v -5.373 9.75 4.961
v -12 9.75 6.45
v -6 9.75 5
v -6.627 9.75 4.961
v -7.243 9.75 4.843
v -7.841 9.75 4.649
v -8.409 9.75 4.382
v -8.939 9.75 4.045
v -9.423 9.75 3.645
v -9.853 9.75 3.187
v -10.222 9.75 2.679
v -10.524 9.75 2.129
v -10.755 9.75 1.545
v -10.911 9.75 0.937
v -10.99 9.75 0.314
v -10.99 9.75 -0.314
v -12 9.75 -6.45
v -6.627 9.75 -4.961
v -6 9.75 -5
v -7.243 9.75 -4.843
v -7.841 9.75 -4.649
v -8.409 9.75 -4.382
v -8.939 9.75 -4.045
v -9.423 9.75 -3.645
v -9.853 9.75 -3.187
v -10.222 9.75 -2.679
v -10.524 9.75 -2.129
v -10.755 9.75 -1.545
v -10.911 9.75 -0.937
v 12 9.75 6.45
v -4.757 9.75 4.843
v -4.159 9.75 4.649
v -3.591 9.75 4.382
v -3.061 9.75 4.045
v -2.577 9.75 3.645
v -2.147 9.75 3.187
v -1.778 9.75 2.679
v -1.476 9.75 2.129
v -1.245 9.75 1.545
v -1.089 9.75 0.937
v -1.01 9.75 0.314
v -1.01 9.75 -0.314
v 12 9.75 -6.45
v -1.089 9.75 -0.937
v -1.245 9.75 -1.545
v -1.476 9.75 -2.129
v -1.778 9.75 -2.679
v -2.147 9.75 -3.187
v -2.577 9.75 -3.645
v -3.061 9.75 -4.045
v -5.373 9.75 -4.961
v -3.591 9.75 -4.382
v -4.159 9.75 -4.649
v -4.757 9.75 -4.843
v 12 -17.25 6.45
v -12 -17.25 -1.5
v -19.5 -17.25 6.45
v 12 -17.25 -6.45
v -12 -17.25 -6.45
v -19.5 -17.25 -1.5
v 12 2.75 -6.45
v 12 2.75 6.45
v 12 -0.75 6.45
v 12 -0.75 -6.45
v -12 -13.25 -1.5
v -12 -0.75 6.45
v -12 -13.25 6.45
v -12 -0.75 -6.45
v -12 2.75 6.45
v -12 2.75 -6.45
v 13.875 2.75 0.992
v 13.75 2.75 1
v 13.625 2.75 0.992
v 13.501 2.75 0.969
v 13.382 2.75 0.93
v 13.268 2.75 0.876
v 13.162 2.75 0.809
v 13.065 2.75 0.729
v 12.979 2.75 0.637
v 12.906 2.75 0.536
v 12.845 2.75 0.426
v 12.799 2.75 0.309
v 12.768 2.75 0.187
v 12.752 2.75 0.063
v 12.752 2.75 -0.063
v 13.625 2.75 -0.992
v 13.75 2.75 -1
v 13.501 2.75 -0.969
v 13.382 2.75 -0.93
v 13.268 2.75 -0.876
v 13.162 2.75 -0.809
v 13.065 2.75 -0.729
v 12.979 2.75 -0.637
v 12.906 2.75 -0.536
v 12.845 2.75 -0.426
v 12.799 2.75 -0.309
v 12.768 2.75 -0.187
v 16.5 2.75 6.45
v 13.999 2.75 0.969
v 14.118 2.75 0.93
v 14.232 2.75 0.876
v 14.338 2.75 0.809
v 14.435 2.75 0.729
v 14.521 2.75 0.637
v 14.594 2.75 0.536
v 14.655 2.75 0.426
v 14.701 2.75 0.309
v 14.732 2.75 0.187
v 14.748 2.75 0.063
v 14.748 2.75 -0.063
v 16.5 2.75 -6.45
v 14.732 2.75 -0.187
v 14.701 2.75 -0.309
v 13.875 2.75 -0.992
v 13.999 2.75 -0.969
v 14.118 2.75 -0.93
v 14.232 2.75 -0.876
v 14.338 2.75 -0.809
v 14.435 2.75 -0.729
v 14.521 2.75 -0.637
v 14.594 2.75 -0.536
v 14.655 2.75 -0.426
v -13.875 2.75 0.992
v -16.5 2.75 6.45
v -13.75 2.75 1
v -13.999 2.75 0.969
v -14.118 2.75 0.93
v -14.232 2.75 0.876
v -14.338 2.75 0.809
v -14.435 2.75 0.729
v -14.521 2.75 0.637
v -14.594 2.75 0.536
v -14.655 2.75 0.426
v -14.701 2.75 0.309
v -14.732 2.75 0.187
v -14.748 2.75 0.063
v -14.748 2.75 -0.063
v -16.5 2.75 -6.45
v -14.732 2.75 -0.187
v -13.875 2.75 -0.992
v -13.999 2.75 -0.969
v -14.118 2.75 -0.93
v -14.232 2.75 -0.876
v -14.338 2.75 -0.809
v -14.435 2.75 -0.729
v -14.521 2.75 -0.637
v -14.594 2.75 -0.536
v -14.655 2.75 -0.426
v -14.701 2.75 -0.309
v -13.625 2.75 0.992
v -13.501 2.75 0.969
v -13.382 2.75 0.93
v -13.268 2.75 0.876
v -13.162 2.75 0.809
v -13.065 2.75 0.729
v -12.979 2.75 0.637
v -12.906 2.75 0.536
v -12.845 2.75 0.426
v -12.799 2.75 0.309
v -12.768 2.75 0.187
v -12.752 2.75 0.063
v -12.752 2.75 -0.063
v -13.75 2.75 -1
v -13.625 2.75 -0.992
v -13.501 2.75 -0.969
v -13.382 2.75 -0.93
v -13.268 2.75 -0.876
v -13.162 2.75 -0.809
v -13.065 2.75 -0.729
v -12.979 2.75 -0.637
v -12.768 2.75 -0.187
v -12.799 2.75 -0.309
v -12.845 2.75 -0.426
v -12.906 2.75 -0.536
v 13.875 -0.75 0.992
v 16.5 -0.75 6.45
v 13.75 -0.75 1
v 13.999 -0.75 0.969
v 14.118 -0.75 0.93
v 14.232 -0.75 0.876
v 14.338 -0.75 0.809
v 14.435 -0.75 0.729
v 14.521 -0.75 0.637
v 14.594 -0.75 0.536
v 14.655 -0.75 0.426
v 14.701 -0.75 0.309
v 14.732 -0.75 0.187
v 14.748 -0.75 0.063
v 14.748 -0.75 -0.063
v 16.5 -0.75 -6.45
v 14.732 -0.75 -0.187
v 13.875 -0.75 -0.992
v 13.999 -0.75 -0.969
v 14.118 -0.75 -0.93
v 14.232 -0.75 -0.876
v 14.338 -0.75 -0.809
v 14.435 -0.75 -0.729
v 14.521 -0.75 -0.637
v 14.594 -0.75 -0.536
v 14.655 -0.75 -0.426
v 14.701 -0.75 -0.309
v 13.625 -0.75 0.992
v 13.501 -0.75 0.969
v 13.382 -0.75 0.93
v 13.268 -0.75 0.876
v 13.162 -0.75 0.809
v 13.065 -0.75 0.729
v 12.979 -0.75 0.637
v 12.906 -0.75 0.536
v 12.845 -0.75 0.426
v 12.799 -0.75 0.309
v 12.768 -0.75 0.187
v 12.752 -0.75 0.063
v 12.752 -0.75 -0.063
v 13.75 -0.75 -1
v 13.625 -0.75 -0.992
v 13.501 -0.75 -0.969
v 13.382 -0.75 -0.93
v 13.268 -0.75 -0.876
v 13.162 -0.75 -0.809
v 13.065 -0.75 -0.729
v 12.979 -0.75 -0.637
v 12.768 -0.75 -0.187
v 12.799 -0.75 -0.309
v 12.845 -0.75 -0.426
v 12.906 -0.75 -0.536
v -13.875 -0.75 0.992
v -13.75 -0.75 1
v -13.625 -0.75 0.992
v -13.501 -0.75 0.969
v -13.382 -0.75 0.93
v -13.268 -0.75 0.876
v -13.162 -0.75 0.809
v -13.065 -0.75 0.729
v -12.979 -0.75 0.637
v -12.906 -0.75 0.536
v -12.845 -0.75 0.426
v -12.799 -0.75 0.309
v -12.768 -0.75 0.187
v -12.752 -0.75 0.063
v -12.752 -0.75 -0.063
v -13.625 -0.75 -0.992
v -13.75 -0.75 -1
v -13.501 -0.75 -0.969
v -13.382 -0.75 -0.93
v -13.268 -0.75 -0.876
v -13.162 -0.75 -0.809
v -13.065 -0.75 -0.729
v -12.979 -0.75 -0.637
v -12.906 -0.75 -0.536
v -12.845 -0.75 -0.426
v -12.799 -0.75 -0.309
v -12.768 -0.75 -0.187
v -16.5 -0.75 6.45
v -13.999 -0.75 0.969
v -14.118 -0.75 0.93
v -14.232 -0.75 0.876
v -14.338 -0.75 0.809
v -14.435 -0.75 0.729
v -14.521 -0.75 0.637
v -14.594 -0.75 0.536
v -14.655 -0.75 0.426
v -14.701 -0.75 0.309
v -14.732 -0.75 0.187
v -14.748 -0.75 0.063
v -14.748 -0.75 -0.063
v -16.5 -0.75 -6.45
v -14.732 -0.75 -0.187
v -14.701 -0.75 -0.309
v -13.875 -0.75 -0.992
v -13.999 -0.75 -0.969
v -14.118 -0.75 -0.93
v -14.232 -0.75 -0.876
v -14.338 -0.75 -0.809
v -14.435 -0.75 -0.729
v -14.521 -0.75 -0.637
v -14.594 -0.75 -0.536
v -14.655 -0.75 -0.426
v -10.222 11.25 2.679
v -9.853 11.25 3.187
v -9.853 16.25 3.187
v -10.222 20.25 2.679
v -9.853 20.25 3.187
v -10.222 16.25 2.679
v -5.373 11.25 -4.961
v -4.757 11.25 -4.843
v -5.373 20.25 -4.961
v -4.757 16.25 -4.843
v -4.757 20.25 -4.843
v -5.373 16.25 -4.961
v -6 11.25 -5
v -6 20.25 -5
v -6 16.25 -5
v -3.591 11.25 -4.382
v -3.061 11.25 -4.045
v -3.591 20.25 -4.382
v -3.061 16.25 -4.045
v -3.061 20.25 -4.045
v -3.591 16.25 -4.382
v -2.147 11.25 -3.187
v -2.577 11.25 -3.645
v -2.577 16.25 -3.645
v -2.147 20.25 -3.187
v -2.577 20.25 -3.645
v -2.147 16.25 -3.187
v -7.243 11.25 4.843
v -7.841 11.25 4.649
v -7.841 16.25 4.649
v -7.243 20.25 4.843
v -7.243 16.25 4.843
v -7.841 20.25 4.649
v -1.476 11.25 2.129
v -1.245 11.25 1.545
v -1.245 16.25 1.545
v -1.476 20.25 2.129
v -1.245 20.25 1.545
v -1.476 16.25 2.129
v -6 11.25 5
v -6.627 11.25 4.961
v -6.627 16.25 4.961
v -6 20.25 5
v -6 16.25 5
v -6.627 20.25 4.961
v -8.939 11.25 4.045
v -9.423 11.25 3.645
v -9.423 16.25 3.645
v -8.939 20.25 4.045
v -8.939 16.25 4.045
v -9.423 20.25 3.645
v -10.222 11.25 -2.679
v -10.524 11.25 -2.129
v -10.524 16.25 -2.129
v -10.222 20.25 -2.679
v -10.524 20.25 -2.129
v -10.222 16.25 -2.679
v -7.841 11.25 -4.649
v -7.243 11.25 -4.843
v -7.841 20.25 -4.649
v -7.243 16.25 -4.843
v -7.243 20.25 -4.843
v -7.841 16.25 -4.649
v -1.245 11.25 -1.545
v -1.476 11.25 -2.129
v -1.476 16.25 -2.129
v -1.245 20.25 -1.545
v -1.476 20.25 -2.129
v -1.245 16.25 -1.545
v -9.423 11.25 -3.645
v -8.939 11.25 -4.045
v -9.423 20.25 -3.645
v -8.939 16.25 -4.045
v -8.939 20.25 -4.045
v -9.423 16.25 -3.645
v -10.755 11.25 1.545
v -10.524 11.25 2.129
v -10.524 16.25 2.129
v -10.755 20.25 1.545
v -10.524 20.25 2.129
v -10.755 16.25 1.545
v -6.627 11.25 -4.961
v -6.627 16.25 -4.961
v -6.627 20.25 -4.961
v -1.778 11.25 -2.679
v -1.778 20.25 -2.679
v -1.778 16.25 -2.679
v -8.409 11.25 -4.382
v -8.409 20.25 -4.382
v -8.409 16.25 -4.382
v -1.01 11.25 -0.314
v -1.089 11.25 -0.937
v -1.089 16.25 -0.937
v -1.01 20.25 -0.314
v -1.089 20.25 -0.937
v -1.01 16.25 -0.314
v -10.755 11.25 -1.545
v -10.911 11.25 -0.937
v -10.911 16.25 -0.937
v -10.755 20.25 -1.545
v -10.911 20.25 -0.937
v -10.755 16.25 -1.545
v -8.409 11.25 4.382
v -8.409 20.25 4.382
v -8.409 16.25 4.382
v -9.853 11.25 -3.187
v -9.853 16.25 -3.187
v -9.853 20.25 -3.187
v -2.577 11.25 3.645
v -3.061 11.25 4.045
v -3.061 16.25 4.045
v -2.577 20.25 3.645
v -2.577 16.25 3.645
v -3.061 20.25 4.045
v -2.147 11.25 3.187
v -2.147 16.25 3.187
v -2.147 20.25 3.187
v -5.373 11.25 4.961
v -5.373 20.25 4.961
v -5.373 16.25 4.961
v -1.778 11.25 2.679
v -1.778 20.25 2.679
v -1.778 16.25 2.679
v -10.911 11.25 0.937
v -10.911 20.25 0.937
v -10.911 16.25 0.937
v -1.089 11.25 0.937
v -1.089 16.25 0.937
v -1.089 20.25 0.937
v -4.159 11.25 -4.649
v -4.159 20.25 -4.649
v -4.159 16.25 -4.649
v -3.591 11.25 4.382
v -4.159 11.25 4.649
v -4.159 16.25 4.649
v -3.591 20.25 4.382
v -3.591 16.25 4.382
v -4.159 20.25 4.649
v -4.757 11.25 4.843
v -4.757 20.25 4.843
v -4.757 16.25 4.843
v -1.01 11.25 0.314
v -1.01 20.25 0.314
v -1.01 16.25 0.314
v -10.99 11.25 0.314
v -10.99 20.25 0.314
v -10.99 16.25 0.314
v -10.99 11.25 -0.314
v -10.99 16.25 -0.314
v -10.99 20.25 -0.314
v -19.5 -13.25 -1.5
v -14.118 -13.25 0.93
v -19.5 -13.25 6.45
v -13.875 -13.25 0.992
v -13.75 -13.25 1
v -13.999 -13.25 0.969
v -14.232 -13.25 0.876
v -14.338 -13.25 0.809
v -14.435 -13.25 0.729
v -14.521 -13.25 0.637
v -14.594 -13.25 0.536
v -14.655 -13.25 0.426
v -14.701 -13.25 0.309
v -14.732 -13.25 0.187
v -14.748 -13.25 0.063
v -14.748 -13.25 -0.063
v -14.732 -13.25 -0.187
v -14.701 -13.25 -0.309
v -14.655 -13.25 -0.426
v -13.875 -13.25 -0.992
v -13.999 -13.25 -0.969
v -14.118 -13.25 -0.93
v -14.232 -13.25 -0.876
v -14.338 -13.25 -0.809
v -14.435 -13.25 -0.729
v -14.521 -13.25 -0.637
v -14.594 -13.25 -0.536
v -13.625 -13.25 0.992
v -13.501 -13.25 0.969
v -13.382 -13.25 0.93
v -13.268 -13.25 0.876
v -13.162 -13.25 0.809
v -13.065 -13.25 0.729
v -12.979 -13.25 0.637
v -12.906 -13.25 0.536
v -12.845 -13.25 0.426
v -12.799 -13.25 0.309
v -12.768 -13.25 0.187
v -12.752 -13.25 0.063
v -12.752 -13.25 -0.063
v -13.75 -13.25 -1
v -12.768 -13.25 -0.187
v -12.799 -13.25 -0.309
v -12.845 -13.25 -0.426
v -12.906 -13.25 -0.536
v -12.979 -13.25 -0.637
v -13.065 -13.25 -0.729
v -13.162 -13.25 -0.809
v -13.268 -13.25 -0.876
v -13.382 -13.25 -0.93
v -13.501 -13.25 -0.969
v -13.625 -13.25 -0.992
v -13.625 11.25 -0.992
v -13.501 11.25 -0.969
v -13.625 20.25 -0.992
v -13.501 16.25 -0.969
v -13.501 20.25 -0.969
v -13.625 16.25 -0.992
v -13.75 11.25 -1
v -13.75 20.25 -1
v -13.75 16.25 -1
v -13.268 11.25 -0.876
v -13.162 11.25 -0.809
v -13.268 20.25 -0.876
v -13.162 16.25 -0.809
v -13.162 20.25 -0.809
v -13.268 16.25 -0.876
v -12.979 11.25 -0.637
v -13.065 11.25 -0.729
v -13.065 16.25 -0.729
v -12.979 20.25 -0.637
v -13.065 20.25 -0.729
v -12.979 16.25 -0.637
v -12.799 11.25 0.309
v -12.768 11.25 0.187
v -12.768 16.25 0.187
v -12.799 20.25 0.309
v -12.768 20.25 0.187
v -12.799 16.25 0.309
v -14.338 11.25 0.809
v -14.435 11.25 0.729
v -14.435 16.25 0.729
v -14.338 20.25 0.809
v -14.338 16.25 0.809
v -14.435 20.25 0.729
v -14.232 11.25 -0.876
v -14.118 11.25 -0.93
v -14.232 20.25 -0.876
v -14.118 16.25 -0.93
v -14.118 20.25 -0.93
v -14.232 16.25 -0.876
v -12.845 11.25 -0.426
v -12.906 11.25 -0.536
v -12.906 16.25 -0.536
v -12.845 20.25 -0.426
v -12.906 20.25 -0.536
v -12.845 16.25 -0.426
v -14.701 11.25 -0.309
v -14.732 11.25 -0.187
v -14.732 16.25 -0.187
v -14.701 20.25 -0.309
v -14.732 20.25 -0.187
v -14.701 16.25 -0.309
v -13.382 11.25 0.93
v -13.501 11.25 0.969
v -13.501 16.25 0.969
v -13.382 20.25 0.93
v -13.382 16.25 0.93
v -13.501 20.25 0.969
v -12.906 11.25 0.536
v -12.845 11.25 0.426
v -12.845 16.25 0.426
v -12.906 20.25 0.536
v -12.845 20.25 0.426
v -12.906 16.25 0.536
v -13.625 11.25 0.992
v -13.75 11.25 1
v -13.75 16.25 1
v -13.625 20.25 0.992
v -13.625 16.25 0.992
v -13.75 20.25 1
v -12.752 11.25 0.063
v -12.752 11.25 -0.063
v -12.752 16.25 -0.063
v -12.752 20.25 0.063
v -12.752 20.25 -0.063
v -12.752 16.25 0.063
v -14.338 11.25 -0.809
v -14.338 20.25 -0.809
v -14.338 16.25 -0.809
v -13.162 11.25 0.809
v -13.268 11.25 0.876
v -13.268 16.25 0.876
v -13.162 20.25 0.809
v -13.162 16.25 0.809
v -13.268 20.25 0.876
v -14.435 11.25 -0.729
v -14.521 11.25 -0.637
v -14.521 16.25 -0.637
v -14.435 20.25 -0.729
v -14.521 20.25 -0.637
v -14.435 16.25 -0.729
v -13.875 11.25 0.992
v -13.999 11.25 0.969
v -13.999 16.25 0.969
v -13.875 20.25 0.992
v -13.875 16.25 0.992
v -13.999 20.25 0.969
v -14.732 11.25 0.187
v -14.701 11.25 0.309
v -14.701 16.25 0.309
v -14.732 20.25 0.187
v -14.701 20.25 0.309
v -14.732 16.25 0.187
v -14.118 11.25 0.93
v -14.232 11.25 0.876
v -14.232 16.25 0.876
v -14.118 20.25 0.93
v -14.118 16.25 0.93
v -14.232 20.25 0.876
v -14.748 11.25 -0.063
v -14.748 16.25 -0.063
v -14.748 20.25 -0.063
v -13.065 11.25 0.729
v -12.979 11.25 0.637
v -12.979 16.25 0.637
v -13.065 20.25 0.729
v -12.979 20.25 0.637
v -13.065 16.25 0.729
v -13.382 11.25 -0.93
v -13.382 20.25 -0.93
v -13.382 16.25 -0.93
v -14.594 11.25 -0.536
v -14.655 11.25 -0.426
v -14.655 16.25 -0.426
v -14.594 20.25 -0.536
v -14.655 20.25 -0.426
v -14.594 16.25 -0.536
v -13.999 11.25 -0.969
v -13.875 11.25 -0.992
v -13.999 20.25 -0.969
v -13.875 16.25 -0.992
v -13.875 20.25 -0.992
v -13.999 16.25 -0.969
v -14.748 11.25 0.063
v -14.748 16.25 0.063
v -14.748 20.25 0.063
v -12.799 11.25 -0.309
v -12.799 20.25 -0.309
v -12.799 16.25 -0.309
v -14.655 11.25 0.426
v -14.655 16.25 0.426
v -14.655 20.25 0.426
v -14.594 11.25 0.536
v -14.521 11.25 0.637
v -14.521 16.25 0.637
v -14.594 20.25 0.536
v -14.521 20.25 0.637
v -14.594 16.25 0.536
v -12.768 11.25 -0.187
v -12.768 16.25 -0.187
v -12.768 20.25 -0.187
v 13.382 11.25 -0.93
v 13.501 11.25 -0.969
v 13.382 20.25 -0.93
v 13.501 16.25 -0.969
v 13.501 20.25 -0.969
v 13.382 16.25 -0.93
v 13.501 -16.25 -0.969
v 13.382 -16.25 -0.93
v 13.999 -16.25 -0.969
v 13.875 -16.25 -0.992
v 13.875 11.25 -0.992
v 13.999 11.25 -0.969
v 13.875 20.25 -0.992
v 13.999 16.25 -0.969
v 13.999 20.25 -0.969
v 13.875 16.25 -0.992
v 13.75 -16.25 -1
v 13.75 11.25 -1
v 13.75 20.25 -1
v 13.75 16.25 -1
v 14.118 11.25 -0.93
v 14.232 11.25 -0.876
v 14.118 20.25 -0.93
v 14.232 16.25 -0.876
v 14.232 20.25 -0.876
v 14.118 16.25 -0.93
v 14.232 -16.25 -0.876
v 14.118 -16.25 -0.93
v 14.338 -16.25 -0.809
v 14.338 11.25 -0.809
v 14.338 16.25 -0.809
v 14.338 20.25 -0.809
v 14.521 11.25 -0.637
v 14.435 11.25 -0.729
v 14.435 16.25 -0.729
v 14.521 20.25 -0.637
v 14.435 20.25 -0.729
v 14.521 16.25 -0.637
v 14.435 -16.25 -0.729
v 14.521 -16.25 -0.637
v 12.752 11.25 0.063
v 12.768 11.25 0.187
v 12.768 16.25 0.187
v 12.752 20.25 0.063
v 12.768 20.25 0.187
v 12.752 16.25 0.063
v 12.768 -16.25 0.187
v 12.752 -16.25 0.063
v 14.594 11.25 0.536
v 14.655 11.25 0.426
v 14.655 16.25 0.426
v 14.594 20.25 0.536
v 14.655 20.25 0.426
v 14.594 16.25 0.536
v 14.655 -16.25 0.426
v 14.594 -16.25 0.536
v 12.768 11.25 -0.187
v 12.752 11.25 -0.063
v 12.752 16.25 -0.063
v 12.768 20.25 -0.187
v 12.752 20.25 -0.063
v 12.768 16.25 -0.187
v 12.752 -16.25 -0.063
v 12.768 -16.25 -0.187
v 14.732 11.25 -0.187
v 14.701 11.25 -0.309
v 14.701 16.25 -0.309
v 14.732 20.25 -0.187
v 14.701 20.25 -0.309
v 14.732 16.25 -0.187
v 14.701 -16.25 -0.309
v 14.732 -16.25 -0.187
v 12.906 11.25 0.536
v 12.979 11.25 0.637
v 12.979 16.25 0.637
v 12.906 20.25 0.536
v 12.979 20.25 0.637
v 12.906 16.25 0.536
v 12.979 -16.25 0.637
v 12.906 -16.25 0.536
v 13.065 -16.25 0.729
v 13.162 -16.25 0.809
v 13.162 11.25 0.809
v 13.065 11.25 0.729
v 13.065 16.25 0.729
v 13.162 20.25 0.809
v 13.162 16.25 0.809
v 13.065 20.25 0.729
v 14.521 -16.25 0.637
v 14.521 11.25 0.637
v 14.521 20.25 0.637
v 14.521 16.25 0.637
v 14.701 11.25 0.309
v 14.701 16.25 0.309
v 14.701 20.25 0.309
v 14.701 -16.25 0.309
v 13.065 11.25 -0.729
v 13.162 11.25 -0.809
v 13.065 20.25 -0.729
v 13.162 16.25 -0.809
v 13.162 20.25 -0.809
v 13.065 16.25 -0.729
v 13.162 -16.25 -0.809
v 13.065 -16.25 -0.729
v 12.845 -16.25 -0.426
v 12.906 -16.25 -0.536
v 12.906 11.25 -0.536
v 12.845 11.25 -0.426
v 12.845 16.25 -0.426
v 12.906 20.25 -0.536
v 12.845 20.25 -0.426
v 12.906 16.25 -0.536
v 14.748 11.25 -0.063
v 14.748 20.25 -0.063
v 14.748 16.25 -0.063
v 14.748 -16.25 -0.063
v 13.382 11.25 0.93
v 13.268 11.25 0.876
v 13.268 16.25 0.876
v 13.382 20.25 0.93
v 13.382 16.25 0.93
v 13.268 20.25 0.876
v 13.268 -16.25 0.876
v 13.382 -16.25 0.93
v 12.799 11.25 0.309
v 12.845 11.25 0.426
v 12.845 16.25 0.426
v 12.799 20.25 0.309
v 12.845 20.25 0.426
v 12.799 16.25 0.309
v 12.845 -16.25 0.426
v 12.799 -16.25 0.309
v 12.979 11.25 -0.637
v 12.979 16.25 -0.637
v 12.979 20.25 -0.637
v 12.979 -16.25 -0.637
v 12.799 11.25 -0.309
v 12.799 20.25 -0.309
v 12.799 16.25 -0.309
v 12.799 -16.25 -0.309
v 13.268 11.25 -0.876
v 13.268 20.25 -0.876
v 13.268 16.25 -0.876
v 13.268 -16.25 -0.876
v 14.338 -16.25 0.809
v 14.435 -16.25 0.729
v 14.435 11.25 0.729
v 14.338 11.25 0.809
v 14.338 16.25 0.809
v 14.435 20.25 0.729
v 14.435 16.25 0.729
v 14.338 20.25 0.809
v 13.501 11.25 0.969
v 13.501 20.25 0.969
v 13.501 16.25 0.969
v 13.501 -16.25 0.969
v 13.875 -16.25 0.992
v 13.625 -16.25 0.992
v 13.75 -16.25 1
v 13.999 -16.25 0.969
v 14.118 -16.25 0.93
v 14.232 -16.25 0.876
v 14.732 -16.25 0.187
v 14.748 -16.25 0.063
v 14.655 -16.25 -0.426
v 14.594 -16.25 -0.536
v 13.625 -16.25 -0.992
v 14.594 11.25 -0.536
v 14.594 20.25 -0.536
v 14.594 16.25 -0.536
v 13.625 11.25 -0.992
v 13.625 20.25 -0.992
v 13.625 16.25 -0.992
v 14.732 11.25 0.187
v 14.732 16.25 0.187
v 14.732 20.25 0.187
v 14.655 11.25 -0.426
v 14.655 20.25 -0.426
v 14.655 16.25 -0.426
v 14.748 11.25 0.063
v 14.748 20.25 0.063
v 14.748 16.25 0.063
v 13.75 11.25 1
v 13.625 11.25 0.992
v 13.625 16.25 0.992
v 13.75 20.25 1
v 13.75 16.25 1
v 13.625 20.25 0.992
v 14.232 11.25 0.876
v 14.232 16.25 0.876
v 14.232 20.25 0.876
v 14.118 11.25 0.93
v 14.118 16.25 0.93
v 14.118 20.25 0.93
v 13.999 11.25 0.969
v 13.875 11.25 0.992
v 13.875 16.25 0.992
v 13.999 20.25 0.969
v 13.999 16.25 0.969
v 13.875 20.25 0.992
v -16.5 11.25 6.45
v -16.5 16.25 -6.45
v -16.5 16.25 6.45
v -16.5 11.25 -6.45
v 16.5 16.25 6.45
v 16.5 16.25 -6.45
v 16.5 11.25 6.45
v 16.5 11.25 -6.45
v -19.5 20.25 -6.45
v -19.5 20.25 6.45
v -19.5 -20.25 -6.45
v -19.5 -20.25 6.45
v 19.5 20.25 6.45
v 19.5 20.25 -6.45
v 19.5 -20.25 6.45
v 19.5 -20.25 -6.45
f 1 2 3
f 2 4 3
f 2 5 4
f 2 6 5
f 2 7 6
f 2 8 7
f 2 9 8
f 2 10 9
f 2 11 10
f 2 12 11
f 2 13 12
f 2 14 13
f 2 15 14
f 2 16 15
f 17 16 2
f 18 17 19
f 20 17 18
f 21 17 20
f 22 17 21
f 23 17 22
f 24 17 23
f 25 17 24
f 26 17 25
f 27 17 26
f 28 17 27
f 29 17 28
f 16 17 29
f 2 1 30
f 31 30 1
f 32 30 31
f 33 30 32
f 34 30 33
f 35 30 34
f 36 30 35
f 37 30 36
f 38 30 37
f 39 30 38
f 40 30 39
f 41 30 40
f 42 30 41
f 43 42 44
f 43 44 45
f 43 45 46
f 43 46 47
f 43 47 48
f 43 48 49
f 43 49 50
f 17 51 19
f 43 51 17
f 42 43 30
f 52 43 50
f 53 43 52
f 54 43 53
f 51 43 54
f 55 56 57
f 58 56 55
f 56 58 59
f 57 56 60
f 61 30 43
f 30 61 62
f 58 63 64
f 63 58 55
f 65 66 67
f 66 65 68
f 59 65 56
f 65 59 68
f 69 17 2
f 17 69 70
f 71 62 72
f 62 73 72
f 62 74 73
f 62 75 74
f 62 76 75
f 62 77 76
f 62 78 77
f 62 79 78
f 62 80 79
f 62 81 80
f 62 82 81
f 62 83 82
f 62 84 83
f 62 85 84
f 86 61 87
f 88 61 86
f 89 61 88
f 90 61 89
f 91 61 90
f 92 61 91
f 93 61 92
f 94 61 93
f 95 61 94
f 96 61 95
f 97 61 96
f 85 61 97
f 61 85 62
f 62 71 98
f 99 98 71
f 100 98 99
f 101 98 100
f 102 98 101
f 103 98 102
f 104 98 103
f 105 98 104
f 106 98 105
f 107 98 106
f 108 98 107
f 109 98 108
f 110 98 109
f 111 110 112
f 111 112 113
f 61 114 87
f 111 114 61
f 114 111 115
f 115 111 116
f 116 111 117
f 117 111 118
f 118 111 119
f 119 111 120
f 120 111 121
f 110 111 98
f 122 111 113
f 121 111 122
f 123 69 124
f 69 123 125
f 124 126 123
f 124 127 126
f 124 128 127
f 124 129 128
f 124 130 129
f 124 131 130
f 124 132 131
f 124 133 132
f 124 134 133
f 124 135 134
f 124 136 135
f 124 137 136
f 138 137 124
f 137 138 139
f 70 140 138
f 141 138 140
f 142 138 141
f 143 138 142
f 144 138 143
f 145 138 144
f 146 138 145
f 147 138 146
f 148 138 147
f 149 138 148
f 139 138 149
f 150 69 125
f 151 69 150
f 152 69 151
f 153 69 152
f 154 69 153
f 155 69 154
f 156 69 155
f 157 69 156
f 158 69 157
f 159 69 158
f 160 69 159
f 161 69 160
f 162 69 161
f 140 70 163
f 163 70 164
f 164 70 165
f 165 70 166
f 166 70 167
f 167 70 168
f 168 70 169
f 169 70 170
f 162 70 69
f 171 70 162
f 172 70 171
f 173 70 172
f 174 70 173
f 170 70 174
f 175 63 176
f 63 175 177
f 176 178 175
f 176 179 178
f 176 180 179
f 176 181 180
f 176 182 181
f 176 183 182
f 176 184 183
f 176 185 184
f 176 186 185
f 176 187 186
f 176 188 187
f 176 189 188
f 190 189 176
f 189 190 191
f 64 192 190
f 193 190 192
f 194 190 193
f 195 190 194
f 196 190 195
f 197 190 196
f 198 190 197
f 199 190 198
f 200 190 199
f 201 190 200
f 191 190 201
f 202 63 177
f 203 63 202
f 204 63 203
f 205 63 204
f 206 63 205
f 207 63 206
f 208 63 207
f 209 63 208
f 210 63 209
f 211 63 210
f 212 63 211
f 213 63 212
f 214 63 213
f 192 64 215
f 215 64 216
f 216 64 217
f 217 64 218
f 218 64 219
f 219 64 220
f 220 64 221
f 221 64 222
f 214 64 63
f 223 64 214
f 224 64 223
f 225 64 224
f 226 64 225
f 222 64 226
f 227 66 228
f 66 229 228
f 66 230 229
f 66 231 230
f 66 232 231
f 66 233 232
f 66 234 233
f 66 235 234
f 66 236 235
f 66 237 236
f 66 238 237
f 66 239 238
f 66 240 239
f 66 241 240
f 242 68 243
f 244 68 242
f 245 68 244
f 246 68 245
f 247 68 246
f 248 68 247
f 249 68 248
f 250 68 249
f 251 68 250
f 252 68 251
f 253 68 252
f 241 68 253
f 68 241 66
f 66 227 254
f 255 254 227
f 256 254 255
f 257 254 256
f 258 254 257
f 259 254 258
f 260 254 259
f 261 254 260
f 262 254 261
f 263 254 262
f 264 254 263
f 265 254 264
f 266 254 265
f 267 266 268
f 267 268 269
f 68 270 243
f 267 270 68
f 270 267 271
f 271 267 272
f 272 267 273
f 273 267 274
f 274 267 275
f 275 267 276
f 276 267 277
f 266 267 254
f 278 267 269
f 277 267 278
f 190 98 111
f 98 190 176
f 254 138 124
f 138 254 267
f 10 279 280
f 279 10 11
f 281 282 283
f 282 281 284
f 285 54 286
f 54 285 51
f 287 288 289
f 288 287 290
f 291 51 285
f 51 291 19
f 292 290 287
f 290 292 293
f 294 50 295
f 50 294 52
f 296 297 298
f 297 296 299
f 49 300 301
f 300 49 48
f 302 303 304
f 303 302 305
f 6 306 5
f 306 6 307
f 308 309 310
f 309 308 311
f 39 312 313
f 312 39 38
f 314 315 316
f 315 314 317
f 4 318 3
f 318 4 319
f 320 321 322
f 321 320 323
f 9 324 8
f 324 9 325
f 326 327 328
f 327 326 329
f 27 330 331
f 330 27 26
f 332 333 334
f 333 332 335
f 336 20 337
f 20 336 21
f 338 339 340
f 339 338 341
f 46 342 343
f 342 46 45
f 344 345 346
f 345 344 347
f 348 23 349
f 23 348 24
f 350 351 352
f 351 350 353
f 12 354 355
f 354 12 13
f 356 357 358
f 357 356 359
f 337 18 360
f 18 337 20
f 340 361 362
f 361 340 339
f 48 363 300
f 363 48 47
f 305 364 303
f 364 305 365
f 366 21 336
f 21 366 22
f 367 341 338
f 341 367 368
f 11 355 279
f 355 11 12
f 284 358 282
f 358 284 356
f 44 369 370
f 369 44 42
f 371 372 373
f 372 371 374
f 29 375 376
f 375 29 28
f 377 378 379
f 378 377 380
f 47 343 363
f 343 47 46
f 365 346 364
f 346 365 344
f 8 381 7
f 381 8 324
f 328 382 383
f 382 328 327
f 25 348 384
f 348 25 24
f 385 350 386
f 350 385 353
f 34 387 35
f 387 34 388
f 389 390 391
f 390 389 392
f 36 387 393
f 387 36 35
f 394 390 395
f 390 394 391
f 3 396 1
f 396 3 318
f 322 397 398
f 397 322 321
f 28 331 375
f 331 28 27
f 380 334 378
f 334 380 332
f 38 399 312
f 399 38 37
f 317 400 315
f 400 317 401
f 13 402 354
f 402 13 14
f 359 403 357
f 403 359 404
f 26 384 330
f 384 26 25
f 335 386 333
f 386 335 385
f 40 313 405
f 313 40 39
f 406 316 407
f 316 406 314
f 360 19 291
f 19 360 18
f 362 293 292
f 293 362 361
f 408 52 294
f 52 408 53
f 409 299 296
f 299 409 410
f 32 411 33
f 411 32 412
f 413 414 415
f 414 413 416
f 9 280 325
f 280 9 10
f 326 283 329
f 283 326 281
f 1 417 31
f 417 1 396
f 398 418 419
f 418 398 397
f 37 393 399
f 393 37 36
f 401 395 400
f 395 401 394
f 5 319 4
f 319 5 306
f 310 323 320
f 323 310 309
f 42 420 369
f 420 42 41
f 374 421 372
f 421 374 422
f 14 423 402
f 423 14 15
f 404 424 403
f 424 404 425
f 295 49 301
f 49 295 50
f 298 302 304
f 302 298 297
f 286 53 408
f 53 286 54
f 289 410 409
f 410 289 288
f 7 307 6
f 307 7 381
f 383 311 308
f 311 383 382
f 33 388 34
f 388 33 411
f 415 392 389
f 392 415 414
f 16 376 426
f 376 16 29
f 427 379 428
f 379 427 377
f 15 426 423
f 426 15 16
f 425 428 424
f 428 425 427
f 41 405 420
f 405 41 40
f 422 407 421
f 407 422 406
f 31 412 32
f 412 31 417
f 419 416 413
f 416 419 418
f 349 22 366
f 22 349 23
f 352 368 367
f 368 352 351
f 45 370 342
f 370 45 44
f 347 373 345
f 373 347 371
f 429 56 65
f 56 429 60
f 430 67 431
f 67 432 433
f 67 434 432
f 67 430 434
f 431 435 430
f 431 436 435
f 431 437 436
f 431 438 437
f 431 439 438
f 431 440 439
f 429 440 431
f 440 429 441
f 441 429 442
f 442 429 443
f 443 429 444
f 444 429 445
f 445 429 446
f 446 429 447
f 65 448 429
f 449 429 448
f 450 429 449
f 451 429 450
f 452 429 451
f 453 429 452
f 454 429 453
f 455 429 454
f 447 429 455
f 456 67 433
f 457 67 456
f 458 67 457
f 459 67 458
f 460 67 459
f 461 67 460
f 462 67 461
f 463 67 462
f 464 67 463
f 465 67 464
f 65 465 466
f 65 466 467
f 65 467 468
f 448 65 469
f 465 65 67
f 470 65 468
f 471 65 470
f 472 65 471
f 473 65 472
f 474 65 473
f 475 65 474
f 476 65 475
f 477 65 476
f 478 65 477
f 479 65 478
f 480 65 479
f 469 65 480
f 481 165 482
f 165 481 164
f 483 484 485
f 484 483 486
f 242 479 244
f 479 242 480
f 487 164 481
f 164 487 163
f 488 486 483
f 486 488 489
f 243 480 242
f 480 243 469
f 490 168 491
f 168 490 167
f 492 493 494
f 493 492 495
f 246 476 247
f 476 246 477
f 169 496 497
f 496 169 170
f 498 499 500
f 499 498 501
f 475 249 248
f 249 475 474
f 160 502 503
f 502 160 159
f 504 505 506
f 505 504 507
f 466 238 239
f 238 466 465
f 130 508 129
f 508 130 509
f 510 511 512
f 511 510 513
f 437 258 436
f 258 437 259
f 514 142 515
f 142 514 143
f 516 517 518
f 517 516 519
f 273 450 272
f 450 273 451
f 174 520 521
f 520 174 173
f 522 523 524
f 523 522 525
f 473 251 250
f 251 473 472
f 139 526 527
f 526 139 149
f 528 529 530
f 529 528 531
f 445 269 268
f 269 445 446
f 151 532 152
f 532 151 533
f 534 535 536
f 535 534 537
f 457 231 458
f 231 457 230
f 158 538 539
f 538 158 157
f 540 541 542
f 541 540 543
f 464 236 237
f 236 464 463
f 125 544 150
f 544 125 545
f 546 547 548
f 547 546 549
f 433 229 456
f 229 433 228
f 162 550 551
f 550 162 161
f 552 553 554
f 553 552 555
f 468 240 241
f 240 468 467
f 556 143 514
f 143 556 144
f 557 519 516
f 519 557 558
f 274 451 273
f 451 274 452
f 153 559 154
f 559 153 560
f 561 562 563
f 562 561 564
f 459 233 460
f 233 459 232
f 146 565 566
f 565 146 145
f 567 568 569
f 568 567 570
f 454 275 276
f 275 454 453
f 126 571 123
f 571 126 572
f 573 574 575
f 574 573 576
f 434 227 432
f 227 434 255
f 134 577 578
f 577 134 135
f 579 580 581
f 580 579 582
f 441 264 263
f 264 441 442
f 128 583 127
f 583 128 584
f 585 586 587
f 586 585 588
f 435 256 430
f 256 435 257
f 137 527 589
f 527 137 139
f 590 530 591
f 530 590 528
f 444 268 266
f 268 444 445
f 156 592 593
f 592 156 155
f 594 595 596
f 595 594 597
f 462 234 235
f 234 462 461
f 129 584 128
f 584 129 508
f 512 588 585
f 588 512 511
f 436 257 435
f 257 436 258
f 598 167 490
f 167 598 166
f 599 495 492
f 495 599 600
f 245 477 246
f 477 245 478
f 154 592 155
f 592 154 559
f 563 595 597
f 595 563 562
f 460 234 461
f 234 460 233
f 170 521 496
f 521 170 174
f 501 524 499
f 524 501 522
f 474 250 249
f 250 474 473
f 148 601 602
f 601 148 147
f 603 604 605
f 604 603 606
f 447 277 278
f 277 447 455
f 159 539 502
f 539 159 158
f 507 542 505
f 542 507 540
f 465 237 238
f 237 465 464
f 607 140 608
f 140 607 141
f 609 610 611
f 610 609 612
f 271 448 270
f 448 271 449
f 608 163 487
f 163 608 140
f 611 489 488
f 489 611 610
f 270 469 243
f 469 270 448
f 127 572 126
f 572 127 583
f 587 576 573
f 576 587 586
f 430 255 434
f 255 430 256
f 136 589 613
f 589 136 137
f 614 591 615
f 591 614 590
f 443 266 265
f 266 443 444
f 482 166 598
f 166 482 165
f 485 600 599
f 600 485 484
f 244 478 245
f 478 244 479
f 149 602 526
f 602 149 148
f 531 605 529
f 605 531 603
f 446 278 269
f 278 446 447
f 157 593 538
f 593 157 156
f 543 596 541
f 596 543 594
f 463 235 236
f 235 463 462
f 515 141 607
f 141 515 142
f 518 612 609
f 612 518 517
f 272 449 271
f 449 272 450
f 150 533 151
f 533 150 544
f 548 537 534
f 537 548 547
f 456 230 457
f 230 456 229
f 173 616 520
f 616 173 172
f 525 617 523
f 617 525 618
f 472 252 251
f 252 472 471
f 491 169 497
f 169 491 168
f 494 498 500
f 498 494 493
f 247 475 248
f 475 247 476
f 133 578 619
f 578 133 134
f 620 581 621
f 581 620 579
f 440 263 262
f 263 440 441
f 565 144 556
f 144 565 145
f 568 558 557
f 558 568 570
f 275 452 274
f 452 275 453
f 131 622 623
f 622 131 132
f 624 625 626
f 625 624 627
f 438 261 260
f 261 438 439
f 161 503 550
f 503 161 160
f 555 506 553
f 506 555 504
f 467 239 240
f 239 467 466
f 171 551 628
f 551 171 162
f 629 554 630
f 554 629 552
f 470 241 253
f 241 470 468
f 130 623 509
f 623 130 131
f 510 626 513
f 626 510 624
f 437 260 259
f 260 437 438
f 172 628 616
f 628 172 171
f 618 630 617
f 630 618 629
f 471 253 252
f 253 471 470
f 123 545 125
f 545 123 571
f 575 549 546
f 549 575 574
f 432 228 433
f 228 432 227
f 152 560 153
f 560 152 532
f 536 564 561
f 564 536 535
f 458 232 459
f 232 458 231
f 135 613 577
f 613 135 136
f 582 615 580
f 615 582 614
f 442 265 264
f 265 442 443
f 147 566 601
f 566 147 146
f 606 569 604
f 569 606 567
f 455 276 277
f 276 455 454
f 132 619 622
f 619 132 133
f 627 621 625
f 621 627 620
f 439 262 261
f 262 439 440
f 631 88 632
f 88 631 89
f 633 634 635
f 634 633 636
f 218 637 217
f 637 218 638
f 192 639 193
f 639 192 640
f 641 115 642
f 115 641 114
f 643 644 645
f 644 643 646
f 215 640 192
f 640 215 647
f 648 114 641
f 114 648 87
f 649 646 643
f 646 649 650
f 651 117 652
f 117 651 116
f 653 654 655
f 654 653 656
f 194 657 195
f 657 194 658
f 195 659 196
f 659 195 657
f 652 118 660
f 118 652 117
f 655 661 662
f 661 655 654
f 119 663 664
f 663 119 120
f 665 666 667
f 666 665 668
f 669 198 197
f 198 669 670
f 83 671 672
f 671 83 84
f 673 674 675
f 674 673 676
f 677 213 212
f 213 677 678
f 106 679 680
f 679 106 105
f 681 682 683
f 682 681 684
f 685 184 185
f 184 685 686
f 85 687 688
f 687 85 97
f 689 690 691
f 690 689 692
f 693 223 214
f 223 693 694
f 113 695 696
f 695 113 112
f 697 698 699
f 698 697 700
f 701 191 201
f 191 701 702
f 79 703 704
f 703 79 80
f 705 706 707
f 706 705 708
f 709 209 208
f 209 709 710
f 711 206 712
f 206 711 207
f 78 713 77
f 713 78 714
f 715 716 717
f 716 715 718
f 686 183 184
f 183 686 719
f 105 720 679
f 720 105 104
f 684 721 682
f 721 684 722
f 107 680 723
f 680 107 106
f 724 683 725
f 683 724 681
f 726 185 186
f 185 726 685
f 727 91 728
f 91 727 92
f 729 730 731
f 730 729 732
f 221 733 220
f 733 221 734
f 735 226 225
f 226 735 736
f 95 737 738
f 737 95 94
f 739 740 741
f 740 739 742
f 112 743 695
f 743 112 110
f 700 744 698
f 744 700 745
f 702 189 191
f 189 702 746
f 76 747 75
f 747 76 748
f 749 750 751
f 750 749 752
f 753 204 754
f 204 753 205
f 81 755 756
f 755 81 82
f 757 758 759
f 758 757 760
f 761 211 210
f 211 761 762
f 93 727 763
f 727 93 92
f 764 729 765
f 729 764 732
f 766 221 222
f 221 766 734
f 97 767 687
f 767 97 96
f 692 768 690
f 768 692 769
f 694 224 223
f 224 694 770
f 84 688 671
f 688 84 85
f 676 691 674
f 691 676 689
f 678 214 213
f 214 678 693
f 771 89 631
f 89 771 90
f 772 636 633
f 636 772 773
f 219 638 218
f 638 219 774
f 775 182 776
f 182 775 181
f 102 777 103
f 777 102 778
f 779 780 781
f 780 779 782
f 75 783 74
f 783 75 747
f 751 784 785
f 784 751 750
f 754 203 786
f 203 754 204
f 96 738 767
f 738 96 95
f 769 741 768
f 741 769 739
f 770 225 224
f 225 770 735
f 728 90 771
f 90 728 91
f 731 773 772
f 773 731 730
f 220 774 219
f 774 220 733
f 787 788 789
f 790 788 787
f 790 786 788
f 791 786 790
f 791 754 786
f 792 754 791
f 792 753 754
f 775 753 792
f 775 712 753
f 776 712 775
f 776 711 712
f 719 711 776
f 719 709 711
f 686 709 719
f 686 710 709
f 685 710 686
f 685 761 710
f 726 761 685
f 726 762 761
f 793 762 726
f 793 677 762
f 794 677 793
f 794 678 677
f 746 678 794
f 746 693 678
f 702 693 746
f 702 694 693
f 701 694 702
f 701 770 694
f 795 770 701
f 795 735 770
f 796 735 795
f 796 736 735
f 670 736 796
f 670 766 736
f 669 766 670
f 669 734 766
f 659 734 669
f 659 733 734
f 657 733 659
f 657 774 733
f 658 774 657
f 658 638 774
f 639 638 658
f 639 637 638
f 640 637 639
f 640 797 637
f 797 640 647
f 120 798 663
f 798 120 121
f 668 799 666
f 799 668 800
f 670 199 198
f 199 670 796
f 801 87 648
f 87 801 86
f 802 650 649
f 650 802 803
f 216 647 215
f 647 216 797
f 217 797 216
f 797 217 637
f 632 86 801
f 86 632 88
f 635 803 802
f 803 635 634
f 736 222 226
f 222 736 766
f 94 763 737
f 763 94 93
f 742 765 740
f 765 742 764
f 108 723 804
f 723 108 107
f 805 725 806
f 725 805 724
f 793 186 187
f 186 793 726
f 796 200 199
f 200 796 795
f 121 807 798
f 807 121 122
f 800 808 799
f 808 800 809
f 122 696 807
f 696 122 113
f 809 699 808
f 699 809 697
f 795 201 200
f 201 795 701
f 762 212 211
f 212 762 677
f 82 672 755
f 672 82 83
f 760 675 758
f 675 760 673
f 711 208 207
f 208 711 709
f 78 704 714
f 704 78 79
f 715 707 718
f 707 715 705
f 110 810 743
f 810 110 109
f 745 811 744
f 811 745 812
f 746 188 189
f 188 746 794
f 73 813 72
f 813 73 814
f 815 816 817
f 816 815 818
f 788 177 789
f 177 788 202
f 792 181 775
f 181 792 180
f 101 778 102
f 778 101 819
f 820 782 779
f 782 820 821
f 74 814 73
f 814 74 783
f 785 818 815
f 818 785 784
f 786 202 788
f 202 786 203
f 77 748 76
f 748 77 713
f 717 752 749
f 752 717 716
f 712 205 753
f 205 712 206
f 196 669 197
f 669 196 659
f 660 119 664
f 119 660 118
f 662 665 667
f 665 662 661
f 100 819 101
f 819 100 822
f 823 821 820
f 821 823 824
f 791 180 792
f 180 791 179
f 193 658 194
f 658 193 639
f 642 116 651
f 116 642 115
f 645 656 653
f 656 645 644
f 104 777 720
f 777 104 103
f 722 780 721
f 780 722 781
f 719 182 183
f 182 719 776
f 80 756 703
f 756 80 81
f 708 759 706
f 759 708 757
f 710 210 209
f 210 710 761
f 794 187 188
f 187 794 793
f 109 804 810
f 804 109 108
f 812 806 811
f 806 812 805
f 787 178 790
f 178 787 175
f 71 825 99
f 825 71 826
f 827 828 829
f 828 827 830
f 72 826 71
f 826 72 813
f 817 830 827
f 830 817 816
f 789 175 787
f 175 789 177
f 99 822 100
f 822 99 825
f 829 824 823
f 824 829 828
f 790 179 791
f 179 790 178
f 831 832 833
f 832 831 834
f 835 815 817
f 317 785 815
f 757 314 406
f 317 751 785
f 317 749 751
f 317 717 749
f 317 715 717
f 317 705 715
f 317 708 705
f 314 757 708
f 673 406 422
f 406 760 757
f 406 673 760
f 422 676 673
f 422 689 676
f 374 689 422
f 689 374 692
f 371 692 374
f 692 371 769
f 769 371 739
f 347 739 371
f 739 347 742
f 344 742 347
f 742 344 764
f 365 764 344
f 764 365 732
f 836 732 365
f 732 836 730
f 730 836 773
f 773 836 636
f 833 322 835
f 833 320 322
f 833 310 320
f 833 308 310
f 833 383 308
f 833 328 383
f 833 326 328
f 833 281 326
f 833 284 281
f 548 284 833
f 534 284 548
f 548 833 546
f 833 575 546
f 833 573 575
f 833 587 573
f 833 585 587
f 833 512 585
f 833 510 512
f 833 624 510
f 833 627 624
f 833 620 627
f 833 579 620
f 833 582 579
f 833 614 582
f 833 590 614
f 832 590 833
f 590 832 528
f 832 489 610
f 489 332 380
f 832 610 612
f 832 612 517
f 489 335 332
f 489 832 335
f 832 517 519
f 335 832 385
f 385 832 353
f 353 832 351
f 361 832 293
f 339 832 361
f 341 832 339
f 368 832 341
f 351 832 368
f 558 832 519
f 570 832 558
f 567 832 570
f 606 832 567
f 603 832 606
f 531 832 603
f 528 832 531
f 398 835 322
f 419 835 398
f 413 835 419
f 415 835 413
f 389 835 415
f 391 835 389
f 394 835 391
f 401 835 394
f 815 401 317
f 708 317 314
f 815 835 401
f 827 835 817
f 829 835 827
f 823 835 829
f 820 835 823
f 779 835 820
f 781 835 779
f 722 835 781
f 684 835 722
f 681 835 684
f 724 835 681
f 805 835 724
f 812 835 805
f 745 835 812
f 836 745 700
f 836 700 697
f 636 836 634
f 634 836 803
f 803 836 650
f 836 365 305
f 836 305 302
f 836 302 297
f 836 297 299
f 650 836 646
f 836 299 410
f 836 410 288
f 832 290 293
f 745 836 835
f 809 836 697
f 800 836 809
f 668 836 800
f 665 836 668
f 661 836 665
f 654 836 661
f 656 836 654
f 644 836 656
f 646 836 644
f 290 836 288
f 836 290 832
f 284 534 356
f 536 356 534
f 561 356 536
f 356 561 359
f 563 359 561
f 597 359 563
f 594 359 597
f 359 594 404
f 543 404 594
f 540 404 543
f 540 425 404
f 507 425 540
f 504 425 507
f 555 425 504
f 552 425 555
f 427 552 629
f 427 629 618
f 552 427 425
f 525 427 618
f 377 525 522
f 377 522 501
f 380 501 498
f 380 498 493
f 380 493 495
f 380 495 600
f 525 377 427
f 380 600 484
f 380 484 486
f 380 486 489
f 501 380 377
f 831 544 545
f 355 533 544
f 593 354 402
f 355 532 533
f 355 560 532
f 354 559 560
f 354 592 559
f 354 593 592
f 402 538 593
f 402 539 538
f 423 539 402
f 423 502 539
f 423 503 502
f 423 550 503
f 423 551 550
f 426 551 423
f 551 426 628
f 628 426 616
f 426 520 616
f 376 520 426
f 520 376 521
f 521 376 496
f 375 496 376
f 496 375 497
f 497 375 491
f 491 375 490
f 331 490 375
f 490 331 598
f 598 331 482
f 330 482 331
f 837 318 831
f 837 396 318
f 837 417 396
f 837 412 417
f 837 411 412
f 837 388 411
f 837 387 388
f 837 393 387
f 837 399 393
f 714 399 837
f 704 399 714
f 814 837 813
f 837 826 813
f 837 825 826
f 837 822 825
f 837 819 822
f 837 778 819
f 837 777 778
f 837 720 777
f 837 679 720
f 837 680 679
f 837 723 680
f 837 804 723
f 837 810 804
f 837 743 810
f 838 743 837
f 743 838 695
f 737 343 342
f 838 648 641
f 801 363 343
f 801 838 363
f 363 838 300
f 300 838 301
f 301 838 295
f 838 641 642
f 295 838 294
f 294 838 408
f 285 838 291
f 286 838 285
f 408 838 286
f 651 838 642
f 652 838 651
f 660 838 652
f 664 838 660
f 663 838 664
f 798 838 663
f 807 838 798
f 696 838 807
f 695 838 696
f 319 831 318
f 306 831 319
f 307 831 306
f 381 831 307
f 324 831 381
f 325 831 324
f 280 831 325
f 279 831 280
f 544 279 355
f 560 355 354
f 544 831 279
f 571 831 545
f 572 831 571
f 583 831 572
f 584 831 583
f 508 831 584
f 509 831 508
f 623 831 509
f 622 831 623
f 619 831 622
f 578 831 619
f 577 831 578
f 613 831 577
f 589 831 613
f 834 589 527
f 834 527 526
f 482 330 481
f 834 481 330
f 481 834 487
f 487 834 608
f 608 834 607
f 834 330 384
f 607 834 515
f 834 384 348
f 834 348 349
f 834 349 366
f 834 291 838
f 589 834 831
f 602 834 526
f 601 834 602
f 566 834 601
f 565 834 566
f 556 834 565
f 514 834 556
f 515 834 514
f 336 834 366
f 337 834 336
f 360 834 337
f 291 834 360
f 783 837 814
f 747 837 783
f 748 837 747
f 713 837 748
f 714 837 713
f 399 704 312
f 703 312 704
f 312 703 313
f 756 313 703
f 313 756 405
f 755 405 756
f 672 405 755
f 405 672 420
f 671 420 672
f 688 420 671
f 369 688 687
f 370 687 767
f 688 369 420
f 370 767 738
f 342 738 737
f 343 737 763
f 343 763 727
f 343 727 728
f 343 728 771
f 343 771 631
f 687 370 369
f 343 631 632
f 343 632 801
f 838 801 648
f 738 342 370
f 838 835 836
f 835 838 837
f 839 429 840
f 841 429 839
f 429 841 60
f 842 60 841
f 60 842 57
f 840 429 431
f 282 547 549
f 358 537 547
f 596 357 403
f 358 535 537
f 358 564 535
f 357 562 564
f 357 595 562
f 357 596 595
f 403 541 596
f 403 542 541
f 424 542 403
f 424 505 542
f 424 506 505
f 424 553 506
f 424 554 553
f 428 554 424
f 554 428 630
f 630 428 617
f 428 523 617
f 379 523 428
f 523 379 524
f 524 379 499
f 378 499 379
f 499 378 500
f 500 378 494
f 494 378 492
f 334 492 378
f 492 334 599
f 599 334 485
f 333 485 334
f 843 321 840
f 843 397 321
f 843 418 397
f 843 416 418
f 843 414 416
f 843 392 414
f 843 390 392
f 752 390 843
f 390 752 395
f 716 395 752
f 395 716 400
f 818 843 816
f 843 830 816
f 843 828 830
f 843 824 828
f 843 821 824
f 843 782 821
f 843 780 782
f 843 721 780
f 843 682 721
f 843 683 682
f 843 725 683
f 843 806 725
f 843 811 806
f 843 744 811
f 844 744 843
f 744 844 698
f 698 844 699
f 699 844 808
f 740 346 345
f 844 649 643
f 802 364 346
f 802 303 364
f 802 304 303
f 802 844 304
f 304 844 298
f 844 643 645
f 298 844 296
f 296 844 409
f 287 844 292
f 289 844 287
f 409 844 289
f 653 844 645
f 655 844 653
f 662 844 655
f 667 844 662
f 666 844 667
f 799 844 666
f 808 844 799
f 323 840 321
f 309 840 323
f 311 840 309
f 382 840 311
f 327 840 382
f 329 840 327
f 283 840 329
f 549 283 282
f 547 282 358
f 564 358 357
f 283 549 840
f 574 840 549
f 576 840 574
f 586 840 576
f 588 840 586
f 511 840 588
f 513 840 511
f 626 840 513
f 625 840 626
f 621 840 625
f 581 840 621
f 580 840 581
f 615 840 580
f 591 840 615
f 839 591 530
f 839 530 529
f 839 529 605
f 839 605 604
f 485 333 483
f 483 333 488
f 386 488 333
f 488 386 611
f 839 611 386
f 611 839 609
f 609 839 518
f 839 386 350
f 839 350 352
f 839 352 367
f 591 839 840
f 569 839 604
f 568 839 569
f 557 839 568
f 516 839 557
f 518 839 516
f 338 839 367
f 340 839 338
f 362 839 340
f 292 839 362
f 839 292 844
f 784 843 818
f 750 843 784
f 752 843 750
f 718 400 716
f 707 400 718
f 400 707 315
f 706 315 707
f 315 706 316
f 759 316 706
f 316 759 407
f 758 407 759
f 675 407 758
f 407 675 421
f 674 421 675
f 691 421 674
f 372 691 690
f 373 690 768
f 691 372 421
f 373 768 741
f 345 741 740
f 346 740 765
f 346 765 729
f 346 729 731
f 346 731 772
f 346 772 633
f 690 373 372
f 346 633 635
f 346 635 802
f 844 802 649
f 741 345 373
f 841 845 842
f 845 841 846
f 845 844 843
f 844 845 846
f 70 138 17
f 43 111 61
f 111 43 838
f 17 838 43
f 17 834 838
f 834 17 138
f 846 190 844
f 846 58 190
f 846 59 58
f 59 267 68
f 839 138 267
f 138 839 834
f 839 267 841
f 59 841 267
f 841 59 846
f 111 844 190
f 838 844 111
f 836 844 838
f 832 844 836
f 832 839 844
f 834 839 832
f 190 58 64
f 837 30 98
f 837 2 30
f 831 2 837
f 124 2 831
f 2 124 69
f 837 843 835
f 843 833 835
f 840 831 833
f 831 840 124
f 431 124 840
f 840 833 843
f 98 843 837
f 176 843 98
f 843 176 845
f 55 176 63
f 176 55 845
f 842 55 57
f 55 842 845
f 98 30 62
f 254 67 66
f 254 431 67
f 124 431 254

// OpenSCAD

lhsOrRhs=1; //Select Lhs or Rhs servo holder


$fn=50; //bigger = smoother/slower

//Parametric rc servo model
//Enetr dimensions as per jpg 
a=29.5;
b=24;
c=27;
d=13;
e=33;
f=16.5;
//g=32.3;
h=27.5;
i=20;
j=6;


mountingHoleDiameter=2;
mountingHoleDepth=19;
splineShaftDiameter=10;
splineShaftHeight=20;
cableHeight=4;
cableWidth=8;
cableLength=15;
//body
module body()
{
cube([d,b,c],center=false); 

//tabs
translate([0,-(e-b)/2,f])
{
    cube([d,e,(i-f)],center=false); 
}
//splineShaft
translate([d/2,j,c])
{
cylinder(h=splineShaftHeight,d=splineShaftDiameter,center=false);
}

//lead 
//translate([-cableWidth/2+d/2,-cableLength,0]) //centered
translate([0,-cableLength,0]) //offset
{
   cube([cableWidth,cableLength,cableHeight],center=false); 
}
}
module mountingHoles()
{
translate([d/2,-(h-b)/2,i-mountingHoleDepth])
{
    cylinder(h=mountingHoleDepth*2,d=mountingHoleDiameter,center=false);
    translate([0,h,0])
    {
      cylinder(h=mountingHoleDepth*2,d=mountingHoleDiameter,center=false); 
    }
}
}


module display()  //with holes for display only
{
    translate([-d/2,-j,0])//center model around spline shaft
    {
    difference()
    {
    body();
    mountingHoles();
    }
}
}
module RCServo() // with mounting hole geometry
{
    translate([-d/2,-j,-a])//center model around spline shaft edit
    {
    
    body();
    mountingHoles();
    
}
}







//Servo Holder made using Servo model

strength=3;
slotGap=5;
slotOffset=-1; //change to get slot in correct position
length=e+strength*2;
width=d-.1;
height=a+slotGap+strength*2;

module mount()
{
difference()
{

//mount
cube([length,width,height],center=true); 
union()
    {
//minus rcServo
translate([b/2-j,0,height/2-strength-slotGap])
rotate([0,0,90])
RCServo();

//minus slot for servo arm

//translate([0,0,height/2-slotGap-strength])
translate([0,0,a/2+slotOffset])
cube([length-strength*2,d,slotGap],center=true); 
    }
}
}

if(lhsOrRhs==0)
{
//lhs

rotate([-90,0,0])
mount();
}



if(lhsOrRhs==1)
{
//rhs

mirror([1,0,0])
rotate([-90,0,0])
mount();
}


